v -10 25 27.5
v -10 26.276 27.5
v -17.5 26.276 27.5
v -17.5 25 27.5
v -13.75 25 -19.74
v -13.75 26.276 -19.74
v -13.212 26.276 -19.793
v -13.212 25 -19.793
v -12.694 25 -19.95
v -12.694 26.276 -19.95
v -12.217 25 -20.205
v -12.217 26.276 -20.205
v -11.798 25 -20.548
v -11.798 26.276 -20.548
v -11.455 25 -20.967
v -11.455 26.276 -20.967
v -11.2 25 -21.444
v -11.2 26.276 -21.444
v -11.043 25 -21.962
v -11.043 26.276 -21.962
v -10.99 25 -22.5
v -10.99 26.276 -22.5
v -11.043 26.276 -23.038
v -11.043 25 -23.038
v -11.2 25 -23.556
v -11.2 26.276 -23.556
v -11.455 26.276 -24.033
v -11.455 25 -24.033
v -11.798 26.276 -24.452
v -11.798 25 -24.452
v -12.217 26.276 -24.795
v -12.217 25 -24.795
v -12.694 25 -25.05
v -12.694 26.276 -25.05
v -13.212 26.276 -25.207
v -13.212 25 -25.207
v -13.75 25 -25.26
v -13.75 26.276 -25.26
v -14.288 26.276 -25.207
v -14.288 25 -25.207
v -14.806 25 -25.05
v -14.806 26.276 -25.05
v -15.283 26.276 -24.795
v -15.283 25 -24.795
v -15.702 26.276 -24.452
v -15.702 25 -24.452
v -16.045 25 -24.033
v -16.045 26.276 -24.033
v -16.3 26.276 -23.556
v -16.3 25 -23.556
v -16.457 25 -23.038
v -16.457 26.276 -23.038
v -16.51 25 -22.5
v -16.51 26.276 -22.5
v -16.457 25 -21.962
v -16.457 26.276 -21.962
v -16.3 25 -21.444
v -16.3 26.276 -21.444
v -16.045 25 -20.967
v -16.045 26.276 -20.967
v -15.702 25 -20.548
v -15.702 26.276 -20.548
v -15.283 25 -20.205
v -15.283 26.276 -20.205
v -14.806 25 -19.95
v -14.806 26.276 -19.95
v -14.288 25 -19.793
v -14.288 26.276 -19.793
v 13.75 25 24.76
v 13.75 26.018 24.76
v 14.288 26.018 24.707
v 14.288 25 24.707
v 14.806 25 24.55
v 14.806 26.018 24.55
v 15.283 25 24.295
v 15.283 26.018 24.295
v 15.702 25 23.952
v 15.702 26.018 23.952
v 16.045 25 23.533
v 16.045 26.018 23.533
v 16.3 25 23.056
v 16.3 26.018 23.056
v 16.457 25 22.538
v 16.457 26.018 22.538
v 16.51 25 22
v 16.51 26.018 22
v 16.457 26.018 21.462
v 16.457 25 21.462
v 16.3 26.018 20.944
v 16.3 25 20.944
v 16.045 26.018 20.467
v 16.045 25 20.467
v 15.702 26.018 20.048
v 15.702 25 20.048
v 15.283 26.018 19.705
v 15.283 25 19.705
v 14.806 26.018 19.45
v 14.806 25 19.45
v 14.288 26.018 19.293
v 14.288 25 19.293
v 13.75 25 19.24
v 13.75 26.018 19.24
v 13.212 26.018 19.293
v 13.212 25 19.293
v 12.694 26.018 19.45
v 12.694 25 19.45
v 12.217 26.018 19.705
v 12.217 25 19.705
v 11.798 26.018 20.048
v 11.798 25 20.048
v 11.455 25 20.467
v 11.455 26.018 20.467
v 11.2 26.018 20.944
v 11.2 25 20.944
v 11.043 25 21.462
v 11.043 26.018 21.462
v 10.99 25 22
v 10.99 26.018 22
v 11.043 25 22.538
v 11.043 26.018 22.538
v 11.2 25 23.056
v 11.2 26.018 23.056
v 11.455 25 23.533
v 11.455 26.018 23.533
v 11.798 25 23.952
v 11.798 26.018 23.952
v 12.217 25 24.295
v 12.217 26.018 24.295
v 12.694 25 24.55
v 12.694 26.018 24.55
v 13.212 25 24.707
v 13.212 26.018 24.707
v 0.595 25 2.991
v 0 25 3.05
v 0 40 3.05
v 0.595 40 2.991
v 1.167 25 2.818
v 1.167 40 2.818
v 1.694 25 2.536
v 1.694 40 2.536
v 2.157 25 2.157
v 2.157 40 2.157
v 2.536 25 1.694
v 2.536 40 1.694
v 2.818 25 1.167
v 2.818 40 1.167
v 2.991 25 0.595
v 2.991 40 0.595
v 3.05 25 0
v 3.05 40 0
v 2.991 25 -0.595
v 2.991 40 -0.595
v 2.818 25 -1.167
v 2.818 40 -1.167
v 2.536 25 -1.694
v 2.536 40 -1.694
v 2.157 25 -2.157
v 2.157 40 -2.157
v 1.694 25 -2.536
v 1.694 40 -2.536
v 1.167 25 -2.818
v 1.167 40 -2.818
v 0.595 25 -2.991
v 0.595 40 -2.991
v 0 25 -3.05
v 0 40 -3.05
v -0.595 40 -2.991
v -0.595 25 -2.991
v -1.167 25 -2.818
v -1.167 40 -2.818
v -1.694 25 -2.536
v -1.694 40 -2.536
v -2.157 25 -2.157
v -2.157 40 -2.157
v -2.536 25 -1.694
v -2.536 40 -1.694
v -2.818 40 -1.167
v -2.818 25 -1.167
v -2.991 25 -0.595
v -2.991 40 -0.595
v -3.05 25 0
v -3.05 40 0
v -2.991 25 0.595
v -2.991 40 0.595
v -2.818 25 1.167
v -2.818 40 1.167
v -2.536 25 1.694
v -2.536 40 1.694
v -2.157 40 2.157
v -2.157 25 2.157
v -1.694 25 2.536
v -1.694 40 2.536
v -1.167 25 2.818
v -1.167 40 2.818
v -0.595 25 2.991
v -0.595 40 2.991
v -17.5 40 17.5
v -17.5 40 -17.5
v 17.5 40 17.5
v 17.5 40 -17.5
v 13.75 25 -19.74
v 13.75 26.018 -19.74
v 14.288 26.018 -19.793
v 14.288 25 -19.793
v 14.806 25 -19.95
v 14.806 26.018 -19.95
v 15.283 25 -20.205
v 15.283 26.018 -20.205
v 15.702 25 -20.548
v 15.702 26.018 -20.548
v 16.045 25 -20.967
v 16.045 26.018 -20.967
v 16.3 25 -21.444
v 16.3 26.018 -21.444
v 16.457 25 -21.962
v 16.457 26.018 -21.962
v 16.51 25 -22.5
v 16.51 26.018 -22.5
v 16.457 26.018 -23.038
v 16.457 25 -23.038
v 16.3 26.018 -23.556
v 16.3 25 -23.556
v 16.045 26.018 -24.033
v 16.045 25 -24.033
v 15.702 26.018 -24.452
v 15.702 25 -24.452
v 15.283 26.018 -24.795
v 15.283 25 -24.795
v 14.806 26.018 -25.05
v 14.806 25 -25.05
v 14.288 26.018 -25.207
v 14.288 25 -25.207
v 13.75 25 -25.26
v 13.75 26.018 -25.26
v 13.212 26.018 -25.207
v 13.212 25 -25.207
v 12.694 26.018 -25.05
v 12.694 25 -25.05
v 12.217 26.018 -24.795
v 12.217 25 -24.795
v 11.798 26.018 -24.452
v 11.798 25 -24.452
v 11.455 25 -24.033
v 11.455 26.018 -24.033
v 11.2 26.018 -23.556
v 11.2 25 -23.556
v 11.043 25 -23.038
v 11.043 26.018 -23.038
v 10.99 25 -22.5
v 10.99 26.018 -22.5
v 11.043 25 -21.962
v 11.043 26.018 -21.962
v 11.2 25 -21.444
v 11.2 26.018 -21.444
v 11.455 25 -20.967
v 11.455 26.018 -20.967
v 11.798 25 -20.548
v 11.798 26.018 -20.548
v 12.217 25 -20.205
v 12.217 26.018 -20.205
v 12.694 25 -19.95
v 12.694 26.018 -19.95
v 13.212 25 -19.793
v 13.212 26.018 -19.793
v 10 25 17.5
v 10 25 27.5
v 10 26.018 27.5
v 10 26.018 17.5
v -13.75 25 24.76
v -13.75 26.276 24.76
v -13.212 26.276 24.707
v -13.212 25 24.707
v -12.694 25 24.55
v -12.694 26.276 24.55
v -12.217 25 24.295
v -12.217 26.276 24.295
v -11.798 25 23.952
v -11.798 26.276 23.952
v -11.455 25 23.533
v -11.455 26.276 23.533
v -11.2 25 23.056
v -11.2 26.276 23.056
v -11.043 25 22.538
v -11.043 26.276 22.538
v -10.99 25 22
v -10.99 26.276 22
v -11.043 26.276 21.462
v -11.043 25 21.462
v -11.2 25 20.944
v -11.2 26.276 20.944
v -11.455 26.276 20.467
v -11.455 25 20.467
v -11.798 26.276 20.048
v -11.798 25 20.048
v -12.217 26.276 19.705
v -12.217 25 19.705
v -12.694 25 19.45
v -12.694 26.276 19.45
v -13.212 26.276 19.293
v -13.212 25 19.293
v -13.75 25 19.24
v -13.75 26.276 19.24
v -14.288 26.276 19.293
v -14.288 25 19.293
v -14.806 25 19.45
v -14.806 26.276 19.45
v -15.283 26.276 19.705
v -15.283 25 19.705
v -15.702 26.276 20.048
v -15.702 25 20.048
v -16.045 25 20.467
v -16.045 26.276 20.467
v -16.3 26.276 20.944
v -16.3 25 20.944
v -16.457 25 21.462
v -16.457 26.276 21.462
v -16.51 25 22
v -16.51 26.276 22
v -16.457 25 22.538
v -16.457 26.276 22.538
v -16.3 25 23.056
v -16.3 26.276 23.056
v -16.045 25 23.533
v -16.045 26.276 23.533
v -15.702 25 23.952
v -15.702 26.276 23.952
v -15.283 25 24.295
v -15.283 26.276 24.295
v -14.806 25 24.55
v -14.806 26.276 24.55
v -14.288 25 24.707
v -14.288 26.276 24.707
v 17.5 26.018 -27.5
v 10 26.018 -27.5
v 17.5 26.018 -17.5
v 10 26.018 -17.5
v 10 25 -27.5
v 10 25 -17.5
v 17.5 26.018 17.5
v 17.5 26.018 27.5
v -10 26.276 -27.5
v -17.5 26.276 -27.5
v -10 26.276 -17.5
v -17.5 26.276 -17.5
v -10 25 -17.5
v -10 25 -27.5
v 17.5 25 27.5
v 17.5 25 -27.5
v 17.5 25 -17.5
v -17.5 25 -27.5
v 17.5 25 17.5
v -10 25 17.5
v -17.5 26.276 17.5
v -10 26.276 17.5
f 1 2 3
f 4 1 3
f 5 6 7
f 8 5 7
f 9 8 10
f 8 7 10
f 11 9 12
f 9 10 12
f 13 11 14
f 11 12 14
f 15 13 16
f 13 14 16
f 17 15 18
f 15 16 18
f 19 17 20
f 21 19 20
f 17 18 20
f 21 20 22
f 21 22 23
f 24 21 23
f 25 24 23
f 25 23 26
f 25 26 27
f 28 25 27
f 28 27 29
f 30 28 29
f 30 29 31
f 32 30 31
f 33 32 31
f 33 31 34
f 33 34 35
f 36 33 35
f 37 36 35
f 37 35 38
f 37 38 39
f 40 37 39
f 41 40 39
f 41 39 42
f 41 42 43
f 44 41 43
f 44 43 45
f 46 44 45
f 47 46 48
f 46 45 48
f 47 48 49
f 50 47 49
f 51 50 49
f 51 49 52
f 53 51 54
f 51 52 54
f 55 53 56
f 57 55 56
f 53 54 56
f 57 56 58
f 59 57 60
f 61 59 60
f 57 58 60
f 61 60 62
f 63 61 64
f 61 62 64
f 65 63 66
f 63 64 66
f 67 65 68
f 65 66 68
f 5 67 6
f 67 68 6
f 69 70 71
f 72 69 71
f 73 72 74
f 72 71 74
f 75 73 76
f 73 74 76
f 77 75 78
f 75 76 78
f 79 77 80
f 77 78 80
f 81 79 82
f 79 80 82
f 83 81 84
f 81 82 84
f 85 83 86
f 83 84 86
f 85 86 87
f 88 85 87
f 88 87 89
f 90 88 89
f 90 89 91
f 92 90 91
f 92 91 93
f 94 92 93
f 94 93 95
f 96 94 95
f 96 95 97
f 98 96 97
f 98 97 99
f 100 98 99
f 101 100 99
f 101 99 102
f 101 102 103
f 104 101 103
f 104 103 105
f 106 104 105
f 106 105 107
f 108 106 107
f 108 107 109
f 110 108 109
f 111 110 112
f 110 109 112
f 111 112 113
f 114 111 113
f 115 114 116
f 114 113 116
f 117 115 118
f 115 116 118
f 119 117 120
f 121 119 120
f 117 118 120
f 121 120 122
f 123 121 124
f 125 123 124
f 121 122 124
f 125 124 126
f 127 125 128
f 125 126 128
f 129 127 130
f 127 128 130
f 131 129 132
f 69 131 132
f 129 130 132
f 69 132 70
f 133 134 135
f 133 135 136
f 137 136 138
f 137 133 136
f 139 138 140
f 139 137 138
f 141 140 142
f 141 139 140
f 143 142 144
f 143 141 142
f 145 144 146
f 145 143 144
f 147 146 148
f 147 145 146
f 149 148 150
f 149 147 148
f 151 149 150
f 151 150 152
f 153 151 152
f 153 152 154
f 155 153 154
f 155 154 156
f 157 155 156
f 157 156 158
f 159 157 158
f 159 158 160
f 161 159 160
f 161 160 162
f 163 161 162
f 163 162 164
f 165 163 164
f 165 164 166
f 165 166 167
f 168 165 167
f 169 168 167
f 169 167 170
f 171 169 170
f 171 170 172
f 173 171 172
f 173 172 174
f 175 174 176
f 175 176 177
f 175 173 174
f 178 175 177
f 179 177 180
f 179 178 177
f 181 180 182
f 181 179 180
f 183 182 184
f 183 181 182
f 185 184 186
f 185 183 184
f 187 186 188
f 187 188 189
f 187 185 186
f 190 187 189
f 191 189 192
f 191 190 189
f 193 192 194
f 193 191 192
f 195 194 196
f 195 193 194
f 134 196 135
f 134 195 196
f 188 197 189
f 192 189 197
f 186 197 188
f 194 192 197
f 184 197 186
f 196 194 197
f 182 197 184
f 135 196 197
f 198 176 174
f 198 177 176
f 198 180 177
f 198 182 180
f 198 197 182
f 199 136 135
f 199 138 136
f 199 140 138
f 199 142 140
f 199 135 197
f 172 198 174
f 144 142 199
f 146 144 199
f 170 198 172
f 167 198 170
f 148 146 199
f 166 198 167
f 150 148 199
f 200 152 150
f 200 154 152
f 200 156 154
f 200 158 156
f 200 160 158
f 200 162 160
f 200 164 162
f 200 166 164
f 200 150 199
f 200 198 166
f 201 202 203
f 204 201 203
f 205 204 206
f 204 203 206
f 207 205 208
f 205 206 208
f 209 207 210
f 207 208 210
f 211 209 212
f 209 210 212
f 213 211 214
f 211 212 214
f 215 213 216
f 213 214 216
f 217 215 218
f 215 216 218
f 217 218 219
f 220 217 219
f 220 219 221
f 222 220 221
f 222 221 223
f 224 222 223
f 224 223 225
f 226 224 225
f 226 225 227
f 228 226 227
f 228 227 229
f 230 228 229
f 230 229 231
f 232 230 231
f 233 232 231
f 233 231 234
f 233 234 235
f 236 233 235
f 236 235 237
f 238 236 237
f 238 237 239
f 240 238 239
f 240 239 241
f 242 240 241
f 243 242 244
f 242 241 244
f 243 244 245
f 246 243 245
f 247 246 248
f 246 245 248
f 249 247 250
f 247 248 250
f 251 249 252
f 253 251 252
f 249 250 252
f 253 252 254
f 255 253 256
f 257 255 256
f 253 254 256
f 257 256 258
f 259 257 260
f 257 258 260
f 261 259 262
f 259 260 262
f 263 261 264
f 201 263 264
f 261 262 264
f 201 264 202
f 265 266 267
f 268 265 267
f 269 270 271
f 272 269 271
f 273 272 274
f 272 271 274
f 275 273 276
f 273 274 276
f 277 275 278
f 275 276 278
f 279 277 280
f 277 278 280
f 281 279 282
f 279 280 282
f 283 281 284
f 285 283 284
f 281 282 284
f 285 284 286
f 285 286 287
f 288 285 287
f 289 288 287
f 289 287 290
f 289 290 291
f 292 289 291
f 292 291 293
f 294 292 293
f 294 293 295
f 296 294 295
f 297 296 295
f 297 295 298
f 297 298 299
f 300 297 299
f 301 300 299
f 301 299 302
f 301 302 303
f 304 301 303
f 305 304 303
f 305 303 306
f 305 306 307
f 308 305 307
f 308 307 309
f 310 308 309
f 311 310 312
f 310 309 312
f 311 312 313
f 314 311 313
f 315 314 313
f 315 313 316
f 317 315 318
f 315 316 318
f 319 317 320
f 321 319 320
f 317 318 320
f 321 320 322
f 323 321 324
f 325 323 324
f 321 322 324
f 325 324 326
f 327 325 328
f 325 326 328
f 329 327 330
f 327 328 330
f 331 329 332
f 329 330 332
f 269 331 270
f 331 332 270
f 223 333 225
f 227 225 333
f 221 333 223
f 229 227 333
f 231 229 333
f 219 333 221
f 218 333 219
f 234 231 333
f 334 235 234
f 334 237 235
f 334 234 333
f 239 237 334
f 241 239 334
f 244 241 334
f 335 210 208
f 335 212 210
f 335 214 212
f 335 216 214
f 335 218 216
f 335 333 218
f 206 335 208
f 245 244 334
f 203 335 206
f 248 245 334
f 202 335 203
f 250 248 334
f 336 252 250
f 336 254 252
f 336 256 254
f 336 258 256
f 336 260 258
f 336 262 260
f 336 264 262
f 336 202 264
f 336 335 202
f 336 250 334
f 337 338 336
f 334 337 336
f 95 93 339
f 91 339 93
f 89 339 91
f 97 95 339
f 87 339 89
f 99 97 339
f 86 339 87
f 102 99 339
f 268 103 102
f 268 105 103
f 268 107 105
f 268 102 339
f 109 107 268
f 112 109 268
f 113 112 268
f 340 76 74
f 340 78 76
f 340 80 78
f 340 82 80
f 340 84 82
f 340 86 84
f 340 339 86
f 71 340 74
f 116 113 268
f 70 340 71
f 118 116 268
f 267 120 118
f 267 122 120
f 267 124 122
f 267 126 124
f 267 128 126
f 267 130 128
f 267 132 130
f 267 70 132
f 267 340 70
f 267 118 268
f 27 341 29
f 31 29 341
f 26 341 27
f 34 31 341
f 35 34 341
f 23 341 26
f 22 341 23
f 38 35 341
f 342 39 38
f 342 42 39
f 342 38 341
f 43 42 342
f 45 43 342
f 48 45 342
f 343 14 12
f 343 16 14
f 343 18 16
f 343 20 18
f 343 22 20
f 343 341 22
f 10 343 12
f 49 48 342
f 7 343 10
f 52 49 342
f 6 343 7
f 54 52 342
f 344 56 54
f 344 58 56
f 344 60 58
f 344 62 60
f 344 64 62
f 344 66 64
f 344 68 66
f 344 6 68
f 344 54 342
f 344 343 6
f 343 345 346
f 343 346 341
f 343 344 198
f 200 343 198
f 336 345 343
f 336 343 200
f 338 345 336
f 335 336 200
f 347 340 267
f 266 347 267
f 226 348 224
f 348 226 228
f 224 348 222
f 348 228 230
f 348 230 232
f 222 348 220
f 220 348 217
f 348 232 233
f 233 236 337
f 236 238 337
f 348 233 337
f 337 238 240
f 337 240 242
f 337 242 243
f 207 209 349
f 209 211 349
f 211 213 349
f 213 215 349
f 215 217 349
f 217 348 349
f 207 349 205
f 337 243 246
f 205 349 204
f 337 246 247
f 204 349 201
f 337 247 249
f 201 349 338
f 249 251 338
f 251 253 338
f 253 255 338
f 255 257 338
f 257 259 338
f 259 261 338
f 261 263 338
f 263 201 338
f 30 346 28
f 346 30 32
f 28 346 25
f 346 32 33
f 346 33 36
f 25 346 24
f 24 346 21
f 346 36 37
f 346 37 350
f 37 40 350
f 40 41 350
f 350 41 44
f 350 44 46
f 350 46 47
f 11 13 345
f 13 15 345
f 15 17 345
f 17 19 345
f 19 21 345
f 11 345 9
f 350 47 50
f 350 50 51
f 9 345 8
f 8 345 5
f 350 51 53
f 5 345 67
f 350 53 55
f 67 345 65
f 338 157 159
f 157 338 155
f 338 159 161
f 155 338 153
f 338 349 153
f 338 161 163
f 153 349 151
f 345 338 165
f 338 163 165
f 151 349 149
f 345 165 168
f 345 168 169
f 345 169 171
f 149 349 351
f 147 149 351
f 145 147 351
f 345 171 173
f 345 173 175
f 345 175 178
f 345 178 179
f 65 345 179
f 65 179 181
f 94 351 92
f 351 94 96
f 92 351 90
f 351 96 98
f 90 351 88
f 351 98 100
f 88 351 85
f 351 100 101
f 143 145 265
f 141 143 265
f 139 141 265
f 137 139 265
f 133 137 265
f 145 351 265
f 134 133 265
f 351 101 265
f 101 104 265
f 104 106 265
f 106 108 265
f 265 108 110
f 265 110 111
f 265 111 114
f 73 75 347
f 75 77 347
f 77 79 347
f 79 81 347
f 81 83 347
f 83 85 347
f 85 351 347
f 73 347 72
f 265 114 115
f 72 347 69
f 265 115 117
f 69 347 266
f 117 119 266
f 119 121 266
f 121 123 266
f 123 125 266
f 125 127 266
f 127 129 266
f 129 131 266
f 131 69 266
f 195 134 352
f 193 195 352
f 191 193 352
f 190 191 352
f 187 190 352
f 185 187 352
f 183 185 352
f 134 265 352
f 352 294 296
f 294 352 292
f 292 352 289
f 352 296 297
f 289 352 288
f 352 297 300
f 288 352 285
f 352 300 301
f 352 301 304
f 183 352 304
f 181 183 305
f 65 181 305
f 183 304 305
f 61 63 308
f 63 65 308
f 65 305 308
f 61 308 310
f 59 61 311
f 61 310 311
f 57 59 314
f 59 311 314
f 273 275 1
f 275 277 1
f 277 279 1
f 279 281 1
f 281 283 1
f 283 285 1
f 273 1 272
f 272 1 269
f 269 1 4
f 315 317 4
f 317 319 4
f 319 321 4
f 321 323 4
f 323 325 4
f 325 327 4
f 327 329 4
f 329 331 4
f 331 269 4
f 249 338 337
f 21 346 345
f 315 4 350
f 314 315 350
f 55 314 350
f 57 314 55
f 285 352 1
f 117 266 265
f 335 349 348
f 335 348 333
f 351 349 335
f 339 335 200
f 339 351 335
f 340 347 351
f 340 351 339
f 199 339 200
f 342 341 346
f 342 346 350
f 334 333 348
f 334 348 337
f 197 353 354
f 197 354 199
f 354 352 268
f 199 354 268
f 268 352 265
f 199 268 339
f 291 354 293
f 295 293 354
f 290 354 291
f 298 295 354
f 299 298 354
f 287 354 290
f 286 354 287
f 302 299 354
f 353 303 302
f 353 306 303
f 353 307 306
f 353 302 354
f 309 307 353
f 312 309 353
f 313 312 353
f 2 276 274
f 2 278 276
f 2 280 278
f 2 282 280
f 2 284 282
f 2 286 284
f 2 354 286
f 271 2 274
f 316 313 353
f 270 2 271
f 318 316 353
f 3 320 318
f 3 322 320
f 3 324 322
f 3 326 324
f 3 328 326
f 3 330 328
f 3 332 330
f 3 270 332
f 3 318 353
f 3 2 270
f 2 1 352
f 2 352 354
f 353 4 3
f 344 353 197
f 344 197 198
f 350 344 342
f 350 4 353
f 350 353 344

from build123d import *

# Parameters (mm, degrees)
SKETCH2_W                = 35
SKETCH2_H                = 35
BOSS_EXTRUDE1_DEPTH      = 10
SKETCH3_W                = 35
SKETCH3_H                = 35
SKETCH3_W_2              = 30
SKETCH3_H_2              = 30
BOSS_EXTRUDE2_DEPTH      = 15
SKETCH4_W                = 35
SKETCH4_H                = 35
BOSS_EXTRUDE3_DEPTH      = 15
CUT_EXTRUDE1_START       = -40
SKETCH5_R                = 3.05
CUT_EXTRUDE1_DEPTH       = 40
BOSS_EXTRUDE4_DEPTH      = 10
BOSS_EXTRUDE4_DEPTH_BACK = 45
SKETCH6_W                = 7.5
SKETCH6_H                = 1.017843133
SKETCH6_H_2              = 1.2761833
SKETCH7_R                = 2.76
CUT_EXTRUDE2_DEPTH       = 10


with BuildPart() as part:
    # Sketch2 → Boss-Extrude1 (new body)
    with BuildSketch(Plane(origin=(0, 0, 0), x_dir=(1, 0, 0), z_dir=(0, 1, 0))):
        Rectangle(SKETCH2_W, SKETCH2_H)
    extrude(amount=BOSS_EXTRUDE1_DEPTH)


with BuildPart() as body_2:
    # Sketch3 → Boss-Extrude2 (new body)
    with BuildSketch(Plane(origin=(0, 10, 0), x_dir=(1, 0, 0), z_dir=(0, 1, 0))):
        Rectangle(SKETCH3_W, SKETCH3_H)
        Rectangle(SKETCH3_W_2, SKETCH3_H_2, mode=Mode.SUBTRACT)
    extrude(amount=BOSS_EXTRUDE2_DEPTH)


with BuildPart() as body_3:
    # Sketch4 → Boss-Extrude3 (new body)
    with BuildSketch(Plane(origin=(0, 25, 0), x_dir=(1, 0, 0), z_dir=(0, 1, 0))):
        Rectangle(SKETCH4_W, SKETCH4_H)
    extrude(amount=BOSS_EXTRUDE3_DEPTH)


with BuildPart() as cut_extrude1_tool:
    # Sketch5 → Cut-Extrude1 (new body)
    with BuildSketch(Plane(origin=(0, 40, 0), x_dir=(1, 0, 0), z_dir=(0, 1, 0)).offset(CUT_EXTRUDE1_START)):
        with Locations(Location((0, 0, 0), (0, 0, 270))):
            Circle(SKETCH5_R)
    extrude(amount=CUT_EXTRUDE1_DEPTH)


with BuildPart() as part_1:
    add(part.part)

    # Cut-Extrude1: cut by cut_extrude1_tool
    add(cut_extrude1_tool.part, mode=Mode.SUBTRACT)


with BuildPart() as body_3_1:
    add(body_3.part)

    # Cut-Extrude1: cut by cut_extrude1_tool
    add(cut_extrude1_tool.part, mode=Mode.SUBTRACT)

    # Sketch6 → Boss-Extrude4 (add, two sides: drawn at the far end of the back side and taken through both)
    with BuildSketch(Plane(origin=(0, 0, -17.5), x_dir=(-1, 0, 0), z_dir=(0, 0, -1)).offset(-BOSS_EXTRUDE4_DEPTH_BACK)):
        with Locations((-13.75, 25.508921566)):
            Rectangle(SKETCH6_W, SKETCH6_H)
        with Locations((13.75, 25.63809165)):
            Rectangle(SKETCH6_W, SKETCH6_H_2)
    extrude(amount=BOSS_EXTRUDE4_DEPTH + BOSS_EXTRUDE4_DEPTH_BACK)

    # Sketch7 → Cut-Extrude2 (cut)
    with BuildSketch(Plane(origin=(0, 26.2761833, 0), x_dir=(1, 0, 0), z_dir=(0, 1, 0))):
        with Locations(Location((-13.75, 22.5, 0), (0, 0, 270))):
            Circle(SKETCH7_R)
        with Locations(Location((13.75, 22.5, 0), (0, 0, 270))):
            Circle(SKETCH7_R)
        with Locations(Location((13.75, -22, 0), (0, 0, 270))):
            Circle(SKETCH7_R)
        with Locations(Location((-13.75, -22, 0), (0, 0, 270))):
            Circle(SKETCH7_R)
    extrude(amount=-CUT_EXTRUDE2_DEPTH, mode=Mode.SUBTRACT)


solid = body_3_1.part
